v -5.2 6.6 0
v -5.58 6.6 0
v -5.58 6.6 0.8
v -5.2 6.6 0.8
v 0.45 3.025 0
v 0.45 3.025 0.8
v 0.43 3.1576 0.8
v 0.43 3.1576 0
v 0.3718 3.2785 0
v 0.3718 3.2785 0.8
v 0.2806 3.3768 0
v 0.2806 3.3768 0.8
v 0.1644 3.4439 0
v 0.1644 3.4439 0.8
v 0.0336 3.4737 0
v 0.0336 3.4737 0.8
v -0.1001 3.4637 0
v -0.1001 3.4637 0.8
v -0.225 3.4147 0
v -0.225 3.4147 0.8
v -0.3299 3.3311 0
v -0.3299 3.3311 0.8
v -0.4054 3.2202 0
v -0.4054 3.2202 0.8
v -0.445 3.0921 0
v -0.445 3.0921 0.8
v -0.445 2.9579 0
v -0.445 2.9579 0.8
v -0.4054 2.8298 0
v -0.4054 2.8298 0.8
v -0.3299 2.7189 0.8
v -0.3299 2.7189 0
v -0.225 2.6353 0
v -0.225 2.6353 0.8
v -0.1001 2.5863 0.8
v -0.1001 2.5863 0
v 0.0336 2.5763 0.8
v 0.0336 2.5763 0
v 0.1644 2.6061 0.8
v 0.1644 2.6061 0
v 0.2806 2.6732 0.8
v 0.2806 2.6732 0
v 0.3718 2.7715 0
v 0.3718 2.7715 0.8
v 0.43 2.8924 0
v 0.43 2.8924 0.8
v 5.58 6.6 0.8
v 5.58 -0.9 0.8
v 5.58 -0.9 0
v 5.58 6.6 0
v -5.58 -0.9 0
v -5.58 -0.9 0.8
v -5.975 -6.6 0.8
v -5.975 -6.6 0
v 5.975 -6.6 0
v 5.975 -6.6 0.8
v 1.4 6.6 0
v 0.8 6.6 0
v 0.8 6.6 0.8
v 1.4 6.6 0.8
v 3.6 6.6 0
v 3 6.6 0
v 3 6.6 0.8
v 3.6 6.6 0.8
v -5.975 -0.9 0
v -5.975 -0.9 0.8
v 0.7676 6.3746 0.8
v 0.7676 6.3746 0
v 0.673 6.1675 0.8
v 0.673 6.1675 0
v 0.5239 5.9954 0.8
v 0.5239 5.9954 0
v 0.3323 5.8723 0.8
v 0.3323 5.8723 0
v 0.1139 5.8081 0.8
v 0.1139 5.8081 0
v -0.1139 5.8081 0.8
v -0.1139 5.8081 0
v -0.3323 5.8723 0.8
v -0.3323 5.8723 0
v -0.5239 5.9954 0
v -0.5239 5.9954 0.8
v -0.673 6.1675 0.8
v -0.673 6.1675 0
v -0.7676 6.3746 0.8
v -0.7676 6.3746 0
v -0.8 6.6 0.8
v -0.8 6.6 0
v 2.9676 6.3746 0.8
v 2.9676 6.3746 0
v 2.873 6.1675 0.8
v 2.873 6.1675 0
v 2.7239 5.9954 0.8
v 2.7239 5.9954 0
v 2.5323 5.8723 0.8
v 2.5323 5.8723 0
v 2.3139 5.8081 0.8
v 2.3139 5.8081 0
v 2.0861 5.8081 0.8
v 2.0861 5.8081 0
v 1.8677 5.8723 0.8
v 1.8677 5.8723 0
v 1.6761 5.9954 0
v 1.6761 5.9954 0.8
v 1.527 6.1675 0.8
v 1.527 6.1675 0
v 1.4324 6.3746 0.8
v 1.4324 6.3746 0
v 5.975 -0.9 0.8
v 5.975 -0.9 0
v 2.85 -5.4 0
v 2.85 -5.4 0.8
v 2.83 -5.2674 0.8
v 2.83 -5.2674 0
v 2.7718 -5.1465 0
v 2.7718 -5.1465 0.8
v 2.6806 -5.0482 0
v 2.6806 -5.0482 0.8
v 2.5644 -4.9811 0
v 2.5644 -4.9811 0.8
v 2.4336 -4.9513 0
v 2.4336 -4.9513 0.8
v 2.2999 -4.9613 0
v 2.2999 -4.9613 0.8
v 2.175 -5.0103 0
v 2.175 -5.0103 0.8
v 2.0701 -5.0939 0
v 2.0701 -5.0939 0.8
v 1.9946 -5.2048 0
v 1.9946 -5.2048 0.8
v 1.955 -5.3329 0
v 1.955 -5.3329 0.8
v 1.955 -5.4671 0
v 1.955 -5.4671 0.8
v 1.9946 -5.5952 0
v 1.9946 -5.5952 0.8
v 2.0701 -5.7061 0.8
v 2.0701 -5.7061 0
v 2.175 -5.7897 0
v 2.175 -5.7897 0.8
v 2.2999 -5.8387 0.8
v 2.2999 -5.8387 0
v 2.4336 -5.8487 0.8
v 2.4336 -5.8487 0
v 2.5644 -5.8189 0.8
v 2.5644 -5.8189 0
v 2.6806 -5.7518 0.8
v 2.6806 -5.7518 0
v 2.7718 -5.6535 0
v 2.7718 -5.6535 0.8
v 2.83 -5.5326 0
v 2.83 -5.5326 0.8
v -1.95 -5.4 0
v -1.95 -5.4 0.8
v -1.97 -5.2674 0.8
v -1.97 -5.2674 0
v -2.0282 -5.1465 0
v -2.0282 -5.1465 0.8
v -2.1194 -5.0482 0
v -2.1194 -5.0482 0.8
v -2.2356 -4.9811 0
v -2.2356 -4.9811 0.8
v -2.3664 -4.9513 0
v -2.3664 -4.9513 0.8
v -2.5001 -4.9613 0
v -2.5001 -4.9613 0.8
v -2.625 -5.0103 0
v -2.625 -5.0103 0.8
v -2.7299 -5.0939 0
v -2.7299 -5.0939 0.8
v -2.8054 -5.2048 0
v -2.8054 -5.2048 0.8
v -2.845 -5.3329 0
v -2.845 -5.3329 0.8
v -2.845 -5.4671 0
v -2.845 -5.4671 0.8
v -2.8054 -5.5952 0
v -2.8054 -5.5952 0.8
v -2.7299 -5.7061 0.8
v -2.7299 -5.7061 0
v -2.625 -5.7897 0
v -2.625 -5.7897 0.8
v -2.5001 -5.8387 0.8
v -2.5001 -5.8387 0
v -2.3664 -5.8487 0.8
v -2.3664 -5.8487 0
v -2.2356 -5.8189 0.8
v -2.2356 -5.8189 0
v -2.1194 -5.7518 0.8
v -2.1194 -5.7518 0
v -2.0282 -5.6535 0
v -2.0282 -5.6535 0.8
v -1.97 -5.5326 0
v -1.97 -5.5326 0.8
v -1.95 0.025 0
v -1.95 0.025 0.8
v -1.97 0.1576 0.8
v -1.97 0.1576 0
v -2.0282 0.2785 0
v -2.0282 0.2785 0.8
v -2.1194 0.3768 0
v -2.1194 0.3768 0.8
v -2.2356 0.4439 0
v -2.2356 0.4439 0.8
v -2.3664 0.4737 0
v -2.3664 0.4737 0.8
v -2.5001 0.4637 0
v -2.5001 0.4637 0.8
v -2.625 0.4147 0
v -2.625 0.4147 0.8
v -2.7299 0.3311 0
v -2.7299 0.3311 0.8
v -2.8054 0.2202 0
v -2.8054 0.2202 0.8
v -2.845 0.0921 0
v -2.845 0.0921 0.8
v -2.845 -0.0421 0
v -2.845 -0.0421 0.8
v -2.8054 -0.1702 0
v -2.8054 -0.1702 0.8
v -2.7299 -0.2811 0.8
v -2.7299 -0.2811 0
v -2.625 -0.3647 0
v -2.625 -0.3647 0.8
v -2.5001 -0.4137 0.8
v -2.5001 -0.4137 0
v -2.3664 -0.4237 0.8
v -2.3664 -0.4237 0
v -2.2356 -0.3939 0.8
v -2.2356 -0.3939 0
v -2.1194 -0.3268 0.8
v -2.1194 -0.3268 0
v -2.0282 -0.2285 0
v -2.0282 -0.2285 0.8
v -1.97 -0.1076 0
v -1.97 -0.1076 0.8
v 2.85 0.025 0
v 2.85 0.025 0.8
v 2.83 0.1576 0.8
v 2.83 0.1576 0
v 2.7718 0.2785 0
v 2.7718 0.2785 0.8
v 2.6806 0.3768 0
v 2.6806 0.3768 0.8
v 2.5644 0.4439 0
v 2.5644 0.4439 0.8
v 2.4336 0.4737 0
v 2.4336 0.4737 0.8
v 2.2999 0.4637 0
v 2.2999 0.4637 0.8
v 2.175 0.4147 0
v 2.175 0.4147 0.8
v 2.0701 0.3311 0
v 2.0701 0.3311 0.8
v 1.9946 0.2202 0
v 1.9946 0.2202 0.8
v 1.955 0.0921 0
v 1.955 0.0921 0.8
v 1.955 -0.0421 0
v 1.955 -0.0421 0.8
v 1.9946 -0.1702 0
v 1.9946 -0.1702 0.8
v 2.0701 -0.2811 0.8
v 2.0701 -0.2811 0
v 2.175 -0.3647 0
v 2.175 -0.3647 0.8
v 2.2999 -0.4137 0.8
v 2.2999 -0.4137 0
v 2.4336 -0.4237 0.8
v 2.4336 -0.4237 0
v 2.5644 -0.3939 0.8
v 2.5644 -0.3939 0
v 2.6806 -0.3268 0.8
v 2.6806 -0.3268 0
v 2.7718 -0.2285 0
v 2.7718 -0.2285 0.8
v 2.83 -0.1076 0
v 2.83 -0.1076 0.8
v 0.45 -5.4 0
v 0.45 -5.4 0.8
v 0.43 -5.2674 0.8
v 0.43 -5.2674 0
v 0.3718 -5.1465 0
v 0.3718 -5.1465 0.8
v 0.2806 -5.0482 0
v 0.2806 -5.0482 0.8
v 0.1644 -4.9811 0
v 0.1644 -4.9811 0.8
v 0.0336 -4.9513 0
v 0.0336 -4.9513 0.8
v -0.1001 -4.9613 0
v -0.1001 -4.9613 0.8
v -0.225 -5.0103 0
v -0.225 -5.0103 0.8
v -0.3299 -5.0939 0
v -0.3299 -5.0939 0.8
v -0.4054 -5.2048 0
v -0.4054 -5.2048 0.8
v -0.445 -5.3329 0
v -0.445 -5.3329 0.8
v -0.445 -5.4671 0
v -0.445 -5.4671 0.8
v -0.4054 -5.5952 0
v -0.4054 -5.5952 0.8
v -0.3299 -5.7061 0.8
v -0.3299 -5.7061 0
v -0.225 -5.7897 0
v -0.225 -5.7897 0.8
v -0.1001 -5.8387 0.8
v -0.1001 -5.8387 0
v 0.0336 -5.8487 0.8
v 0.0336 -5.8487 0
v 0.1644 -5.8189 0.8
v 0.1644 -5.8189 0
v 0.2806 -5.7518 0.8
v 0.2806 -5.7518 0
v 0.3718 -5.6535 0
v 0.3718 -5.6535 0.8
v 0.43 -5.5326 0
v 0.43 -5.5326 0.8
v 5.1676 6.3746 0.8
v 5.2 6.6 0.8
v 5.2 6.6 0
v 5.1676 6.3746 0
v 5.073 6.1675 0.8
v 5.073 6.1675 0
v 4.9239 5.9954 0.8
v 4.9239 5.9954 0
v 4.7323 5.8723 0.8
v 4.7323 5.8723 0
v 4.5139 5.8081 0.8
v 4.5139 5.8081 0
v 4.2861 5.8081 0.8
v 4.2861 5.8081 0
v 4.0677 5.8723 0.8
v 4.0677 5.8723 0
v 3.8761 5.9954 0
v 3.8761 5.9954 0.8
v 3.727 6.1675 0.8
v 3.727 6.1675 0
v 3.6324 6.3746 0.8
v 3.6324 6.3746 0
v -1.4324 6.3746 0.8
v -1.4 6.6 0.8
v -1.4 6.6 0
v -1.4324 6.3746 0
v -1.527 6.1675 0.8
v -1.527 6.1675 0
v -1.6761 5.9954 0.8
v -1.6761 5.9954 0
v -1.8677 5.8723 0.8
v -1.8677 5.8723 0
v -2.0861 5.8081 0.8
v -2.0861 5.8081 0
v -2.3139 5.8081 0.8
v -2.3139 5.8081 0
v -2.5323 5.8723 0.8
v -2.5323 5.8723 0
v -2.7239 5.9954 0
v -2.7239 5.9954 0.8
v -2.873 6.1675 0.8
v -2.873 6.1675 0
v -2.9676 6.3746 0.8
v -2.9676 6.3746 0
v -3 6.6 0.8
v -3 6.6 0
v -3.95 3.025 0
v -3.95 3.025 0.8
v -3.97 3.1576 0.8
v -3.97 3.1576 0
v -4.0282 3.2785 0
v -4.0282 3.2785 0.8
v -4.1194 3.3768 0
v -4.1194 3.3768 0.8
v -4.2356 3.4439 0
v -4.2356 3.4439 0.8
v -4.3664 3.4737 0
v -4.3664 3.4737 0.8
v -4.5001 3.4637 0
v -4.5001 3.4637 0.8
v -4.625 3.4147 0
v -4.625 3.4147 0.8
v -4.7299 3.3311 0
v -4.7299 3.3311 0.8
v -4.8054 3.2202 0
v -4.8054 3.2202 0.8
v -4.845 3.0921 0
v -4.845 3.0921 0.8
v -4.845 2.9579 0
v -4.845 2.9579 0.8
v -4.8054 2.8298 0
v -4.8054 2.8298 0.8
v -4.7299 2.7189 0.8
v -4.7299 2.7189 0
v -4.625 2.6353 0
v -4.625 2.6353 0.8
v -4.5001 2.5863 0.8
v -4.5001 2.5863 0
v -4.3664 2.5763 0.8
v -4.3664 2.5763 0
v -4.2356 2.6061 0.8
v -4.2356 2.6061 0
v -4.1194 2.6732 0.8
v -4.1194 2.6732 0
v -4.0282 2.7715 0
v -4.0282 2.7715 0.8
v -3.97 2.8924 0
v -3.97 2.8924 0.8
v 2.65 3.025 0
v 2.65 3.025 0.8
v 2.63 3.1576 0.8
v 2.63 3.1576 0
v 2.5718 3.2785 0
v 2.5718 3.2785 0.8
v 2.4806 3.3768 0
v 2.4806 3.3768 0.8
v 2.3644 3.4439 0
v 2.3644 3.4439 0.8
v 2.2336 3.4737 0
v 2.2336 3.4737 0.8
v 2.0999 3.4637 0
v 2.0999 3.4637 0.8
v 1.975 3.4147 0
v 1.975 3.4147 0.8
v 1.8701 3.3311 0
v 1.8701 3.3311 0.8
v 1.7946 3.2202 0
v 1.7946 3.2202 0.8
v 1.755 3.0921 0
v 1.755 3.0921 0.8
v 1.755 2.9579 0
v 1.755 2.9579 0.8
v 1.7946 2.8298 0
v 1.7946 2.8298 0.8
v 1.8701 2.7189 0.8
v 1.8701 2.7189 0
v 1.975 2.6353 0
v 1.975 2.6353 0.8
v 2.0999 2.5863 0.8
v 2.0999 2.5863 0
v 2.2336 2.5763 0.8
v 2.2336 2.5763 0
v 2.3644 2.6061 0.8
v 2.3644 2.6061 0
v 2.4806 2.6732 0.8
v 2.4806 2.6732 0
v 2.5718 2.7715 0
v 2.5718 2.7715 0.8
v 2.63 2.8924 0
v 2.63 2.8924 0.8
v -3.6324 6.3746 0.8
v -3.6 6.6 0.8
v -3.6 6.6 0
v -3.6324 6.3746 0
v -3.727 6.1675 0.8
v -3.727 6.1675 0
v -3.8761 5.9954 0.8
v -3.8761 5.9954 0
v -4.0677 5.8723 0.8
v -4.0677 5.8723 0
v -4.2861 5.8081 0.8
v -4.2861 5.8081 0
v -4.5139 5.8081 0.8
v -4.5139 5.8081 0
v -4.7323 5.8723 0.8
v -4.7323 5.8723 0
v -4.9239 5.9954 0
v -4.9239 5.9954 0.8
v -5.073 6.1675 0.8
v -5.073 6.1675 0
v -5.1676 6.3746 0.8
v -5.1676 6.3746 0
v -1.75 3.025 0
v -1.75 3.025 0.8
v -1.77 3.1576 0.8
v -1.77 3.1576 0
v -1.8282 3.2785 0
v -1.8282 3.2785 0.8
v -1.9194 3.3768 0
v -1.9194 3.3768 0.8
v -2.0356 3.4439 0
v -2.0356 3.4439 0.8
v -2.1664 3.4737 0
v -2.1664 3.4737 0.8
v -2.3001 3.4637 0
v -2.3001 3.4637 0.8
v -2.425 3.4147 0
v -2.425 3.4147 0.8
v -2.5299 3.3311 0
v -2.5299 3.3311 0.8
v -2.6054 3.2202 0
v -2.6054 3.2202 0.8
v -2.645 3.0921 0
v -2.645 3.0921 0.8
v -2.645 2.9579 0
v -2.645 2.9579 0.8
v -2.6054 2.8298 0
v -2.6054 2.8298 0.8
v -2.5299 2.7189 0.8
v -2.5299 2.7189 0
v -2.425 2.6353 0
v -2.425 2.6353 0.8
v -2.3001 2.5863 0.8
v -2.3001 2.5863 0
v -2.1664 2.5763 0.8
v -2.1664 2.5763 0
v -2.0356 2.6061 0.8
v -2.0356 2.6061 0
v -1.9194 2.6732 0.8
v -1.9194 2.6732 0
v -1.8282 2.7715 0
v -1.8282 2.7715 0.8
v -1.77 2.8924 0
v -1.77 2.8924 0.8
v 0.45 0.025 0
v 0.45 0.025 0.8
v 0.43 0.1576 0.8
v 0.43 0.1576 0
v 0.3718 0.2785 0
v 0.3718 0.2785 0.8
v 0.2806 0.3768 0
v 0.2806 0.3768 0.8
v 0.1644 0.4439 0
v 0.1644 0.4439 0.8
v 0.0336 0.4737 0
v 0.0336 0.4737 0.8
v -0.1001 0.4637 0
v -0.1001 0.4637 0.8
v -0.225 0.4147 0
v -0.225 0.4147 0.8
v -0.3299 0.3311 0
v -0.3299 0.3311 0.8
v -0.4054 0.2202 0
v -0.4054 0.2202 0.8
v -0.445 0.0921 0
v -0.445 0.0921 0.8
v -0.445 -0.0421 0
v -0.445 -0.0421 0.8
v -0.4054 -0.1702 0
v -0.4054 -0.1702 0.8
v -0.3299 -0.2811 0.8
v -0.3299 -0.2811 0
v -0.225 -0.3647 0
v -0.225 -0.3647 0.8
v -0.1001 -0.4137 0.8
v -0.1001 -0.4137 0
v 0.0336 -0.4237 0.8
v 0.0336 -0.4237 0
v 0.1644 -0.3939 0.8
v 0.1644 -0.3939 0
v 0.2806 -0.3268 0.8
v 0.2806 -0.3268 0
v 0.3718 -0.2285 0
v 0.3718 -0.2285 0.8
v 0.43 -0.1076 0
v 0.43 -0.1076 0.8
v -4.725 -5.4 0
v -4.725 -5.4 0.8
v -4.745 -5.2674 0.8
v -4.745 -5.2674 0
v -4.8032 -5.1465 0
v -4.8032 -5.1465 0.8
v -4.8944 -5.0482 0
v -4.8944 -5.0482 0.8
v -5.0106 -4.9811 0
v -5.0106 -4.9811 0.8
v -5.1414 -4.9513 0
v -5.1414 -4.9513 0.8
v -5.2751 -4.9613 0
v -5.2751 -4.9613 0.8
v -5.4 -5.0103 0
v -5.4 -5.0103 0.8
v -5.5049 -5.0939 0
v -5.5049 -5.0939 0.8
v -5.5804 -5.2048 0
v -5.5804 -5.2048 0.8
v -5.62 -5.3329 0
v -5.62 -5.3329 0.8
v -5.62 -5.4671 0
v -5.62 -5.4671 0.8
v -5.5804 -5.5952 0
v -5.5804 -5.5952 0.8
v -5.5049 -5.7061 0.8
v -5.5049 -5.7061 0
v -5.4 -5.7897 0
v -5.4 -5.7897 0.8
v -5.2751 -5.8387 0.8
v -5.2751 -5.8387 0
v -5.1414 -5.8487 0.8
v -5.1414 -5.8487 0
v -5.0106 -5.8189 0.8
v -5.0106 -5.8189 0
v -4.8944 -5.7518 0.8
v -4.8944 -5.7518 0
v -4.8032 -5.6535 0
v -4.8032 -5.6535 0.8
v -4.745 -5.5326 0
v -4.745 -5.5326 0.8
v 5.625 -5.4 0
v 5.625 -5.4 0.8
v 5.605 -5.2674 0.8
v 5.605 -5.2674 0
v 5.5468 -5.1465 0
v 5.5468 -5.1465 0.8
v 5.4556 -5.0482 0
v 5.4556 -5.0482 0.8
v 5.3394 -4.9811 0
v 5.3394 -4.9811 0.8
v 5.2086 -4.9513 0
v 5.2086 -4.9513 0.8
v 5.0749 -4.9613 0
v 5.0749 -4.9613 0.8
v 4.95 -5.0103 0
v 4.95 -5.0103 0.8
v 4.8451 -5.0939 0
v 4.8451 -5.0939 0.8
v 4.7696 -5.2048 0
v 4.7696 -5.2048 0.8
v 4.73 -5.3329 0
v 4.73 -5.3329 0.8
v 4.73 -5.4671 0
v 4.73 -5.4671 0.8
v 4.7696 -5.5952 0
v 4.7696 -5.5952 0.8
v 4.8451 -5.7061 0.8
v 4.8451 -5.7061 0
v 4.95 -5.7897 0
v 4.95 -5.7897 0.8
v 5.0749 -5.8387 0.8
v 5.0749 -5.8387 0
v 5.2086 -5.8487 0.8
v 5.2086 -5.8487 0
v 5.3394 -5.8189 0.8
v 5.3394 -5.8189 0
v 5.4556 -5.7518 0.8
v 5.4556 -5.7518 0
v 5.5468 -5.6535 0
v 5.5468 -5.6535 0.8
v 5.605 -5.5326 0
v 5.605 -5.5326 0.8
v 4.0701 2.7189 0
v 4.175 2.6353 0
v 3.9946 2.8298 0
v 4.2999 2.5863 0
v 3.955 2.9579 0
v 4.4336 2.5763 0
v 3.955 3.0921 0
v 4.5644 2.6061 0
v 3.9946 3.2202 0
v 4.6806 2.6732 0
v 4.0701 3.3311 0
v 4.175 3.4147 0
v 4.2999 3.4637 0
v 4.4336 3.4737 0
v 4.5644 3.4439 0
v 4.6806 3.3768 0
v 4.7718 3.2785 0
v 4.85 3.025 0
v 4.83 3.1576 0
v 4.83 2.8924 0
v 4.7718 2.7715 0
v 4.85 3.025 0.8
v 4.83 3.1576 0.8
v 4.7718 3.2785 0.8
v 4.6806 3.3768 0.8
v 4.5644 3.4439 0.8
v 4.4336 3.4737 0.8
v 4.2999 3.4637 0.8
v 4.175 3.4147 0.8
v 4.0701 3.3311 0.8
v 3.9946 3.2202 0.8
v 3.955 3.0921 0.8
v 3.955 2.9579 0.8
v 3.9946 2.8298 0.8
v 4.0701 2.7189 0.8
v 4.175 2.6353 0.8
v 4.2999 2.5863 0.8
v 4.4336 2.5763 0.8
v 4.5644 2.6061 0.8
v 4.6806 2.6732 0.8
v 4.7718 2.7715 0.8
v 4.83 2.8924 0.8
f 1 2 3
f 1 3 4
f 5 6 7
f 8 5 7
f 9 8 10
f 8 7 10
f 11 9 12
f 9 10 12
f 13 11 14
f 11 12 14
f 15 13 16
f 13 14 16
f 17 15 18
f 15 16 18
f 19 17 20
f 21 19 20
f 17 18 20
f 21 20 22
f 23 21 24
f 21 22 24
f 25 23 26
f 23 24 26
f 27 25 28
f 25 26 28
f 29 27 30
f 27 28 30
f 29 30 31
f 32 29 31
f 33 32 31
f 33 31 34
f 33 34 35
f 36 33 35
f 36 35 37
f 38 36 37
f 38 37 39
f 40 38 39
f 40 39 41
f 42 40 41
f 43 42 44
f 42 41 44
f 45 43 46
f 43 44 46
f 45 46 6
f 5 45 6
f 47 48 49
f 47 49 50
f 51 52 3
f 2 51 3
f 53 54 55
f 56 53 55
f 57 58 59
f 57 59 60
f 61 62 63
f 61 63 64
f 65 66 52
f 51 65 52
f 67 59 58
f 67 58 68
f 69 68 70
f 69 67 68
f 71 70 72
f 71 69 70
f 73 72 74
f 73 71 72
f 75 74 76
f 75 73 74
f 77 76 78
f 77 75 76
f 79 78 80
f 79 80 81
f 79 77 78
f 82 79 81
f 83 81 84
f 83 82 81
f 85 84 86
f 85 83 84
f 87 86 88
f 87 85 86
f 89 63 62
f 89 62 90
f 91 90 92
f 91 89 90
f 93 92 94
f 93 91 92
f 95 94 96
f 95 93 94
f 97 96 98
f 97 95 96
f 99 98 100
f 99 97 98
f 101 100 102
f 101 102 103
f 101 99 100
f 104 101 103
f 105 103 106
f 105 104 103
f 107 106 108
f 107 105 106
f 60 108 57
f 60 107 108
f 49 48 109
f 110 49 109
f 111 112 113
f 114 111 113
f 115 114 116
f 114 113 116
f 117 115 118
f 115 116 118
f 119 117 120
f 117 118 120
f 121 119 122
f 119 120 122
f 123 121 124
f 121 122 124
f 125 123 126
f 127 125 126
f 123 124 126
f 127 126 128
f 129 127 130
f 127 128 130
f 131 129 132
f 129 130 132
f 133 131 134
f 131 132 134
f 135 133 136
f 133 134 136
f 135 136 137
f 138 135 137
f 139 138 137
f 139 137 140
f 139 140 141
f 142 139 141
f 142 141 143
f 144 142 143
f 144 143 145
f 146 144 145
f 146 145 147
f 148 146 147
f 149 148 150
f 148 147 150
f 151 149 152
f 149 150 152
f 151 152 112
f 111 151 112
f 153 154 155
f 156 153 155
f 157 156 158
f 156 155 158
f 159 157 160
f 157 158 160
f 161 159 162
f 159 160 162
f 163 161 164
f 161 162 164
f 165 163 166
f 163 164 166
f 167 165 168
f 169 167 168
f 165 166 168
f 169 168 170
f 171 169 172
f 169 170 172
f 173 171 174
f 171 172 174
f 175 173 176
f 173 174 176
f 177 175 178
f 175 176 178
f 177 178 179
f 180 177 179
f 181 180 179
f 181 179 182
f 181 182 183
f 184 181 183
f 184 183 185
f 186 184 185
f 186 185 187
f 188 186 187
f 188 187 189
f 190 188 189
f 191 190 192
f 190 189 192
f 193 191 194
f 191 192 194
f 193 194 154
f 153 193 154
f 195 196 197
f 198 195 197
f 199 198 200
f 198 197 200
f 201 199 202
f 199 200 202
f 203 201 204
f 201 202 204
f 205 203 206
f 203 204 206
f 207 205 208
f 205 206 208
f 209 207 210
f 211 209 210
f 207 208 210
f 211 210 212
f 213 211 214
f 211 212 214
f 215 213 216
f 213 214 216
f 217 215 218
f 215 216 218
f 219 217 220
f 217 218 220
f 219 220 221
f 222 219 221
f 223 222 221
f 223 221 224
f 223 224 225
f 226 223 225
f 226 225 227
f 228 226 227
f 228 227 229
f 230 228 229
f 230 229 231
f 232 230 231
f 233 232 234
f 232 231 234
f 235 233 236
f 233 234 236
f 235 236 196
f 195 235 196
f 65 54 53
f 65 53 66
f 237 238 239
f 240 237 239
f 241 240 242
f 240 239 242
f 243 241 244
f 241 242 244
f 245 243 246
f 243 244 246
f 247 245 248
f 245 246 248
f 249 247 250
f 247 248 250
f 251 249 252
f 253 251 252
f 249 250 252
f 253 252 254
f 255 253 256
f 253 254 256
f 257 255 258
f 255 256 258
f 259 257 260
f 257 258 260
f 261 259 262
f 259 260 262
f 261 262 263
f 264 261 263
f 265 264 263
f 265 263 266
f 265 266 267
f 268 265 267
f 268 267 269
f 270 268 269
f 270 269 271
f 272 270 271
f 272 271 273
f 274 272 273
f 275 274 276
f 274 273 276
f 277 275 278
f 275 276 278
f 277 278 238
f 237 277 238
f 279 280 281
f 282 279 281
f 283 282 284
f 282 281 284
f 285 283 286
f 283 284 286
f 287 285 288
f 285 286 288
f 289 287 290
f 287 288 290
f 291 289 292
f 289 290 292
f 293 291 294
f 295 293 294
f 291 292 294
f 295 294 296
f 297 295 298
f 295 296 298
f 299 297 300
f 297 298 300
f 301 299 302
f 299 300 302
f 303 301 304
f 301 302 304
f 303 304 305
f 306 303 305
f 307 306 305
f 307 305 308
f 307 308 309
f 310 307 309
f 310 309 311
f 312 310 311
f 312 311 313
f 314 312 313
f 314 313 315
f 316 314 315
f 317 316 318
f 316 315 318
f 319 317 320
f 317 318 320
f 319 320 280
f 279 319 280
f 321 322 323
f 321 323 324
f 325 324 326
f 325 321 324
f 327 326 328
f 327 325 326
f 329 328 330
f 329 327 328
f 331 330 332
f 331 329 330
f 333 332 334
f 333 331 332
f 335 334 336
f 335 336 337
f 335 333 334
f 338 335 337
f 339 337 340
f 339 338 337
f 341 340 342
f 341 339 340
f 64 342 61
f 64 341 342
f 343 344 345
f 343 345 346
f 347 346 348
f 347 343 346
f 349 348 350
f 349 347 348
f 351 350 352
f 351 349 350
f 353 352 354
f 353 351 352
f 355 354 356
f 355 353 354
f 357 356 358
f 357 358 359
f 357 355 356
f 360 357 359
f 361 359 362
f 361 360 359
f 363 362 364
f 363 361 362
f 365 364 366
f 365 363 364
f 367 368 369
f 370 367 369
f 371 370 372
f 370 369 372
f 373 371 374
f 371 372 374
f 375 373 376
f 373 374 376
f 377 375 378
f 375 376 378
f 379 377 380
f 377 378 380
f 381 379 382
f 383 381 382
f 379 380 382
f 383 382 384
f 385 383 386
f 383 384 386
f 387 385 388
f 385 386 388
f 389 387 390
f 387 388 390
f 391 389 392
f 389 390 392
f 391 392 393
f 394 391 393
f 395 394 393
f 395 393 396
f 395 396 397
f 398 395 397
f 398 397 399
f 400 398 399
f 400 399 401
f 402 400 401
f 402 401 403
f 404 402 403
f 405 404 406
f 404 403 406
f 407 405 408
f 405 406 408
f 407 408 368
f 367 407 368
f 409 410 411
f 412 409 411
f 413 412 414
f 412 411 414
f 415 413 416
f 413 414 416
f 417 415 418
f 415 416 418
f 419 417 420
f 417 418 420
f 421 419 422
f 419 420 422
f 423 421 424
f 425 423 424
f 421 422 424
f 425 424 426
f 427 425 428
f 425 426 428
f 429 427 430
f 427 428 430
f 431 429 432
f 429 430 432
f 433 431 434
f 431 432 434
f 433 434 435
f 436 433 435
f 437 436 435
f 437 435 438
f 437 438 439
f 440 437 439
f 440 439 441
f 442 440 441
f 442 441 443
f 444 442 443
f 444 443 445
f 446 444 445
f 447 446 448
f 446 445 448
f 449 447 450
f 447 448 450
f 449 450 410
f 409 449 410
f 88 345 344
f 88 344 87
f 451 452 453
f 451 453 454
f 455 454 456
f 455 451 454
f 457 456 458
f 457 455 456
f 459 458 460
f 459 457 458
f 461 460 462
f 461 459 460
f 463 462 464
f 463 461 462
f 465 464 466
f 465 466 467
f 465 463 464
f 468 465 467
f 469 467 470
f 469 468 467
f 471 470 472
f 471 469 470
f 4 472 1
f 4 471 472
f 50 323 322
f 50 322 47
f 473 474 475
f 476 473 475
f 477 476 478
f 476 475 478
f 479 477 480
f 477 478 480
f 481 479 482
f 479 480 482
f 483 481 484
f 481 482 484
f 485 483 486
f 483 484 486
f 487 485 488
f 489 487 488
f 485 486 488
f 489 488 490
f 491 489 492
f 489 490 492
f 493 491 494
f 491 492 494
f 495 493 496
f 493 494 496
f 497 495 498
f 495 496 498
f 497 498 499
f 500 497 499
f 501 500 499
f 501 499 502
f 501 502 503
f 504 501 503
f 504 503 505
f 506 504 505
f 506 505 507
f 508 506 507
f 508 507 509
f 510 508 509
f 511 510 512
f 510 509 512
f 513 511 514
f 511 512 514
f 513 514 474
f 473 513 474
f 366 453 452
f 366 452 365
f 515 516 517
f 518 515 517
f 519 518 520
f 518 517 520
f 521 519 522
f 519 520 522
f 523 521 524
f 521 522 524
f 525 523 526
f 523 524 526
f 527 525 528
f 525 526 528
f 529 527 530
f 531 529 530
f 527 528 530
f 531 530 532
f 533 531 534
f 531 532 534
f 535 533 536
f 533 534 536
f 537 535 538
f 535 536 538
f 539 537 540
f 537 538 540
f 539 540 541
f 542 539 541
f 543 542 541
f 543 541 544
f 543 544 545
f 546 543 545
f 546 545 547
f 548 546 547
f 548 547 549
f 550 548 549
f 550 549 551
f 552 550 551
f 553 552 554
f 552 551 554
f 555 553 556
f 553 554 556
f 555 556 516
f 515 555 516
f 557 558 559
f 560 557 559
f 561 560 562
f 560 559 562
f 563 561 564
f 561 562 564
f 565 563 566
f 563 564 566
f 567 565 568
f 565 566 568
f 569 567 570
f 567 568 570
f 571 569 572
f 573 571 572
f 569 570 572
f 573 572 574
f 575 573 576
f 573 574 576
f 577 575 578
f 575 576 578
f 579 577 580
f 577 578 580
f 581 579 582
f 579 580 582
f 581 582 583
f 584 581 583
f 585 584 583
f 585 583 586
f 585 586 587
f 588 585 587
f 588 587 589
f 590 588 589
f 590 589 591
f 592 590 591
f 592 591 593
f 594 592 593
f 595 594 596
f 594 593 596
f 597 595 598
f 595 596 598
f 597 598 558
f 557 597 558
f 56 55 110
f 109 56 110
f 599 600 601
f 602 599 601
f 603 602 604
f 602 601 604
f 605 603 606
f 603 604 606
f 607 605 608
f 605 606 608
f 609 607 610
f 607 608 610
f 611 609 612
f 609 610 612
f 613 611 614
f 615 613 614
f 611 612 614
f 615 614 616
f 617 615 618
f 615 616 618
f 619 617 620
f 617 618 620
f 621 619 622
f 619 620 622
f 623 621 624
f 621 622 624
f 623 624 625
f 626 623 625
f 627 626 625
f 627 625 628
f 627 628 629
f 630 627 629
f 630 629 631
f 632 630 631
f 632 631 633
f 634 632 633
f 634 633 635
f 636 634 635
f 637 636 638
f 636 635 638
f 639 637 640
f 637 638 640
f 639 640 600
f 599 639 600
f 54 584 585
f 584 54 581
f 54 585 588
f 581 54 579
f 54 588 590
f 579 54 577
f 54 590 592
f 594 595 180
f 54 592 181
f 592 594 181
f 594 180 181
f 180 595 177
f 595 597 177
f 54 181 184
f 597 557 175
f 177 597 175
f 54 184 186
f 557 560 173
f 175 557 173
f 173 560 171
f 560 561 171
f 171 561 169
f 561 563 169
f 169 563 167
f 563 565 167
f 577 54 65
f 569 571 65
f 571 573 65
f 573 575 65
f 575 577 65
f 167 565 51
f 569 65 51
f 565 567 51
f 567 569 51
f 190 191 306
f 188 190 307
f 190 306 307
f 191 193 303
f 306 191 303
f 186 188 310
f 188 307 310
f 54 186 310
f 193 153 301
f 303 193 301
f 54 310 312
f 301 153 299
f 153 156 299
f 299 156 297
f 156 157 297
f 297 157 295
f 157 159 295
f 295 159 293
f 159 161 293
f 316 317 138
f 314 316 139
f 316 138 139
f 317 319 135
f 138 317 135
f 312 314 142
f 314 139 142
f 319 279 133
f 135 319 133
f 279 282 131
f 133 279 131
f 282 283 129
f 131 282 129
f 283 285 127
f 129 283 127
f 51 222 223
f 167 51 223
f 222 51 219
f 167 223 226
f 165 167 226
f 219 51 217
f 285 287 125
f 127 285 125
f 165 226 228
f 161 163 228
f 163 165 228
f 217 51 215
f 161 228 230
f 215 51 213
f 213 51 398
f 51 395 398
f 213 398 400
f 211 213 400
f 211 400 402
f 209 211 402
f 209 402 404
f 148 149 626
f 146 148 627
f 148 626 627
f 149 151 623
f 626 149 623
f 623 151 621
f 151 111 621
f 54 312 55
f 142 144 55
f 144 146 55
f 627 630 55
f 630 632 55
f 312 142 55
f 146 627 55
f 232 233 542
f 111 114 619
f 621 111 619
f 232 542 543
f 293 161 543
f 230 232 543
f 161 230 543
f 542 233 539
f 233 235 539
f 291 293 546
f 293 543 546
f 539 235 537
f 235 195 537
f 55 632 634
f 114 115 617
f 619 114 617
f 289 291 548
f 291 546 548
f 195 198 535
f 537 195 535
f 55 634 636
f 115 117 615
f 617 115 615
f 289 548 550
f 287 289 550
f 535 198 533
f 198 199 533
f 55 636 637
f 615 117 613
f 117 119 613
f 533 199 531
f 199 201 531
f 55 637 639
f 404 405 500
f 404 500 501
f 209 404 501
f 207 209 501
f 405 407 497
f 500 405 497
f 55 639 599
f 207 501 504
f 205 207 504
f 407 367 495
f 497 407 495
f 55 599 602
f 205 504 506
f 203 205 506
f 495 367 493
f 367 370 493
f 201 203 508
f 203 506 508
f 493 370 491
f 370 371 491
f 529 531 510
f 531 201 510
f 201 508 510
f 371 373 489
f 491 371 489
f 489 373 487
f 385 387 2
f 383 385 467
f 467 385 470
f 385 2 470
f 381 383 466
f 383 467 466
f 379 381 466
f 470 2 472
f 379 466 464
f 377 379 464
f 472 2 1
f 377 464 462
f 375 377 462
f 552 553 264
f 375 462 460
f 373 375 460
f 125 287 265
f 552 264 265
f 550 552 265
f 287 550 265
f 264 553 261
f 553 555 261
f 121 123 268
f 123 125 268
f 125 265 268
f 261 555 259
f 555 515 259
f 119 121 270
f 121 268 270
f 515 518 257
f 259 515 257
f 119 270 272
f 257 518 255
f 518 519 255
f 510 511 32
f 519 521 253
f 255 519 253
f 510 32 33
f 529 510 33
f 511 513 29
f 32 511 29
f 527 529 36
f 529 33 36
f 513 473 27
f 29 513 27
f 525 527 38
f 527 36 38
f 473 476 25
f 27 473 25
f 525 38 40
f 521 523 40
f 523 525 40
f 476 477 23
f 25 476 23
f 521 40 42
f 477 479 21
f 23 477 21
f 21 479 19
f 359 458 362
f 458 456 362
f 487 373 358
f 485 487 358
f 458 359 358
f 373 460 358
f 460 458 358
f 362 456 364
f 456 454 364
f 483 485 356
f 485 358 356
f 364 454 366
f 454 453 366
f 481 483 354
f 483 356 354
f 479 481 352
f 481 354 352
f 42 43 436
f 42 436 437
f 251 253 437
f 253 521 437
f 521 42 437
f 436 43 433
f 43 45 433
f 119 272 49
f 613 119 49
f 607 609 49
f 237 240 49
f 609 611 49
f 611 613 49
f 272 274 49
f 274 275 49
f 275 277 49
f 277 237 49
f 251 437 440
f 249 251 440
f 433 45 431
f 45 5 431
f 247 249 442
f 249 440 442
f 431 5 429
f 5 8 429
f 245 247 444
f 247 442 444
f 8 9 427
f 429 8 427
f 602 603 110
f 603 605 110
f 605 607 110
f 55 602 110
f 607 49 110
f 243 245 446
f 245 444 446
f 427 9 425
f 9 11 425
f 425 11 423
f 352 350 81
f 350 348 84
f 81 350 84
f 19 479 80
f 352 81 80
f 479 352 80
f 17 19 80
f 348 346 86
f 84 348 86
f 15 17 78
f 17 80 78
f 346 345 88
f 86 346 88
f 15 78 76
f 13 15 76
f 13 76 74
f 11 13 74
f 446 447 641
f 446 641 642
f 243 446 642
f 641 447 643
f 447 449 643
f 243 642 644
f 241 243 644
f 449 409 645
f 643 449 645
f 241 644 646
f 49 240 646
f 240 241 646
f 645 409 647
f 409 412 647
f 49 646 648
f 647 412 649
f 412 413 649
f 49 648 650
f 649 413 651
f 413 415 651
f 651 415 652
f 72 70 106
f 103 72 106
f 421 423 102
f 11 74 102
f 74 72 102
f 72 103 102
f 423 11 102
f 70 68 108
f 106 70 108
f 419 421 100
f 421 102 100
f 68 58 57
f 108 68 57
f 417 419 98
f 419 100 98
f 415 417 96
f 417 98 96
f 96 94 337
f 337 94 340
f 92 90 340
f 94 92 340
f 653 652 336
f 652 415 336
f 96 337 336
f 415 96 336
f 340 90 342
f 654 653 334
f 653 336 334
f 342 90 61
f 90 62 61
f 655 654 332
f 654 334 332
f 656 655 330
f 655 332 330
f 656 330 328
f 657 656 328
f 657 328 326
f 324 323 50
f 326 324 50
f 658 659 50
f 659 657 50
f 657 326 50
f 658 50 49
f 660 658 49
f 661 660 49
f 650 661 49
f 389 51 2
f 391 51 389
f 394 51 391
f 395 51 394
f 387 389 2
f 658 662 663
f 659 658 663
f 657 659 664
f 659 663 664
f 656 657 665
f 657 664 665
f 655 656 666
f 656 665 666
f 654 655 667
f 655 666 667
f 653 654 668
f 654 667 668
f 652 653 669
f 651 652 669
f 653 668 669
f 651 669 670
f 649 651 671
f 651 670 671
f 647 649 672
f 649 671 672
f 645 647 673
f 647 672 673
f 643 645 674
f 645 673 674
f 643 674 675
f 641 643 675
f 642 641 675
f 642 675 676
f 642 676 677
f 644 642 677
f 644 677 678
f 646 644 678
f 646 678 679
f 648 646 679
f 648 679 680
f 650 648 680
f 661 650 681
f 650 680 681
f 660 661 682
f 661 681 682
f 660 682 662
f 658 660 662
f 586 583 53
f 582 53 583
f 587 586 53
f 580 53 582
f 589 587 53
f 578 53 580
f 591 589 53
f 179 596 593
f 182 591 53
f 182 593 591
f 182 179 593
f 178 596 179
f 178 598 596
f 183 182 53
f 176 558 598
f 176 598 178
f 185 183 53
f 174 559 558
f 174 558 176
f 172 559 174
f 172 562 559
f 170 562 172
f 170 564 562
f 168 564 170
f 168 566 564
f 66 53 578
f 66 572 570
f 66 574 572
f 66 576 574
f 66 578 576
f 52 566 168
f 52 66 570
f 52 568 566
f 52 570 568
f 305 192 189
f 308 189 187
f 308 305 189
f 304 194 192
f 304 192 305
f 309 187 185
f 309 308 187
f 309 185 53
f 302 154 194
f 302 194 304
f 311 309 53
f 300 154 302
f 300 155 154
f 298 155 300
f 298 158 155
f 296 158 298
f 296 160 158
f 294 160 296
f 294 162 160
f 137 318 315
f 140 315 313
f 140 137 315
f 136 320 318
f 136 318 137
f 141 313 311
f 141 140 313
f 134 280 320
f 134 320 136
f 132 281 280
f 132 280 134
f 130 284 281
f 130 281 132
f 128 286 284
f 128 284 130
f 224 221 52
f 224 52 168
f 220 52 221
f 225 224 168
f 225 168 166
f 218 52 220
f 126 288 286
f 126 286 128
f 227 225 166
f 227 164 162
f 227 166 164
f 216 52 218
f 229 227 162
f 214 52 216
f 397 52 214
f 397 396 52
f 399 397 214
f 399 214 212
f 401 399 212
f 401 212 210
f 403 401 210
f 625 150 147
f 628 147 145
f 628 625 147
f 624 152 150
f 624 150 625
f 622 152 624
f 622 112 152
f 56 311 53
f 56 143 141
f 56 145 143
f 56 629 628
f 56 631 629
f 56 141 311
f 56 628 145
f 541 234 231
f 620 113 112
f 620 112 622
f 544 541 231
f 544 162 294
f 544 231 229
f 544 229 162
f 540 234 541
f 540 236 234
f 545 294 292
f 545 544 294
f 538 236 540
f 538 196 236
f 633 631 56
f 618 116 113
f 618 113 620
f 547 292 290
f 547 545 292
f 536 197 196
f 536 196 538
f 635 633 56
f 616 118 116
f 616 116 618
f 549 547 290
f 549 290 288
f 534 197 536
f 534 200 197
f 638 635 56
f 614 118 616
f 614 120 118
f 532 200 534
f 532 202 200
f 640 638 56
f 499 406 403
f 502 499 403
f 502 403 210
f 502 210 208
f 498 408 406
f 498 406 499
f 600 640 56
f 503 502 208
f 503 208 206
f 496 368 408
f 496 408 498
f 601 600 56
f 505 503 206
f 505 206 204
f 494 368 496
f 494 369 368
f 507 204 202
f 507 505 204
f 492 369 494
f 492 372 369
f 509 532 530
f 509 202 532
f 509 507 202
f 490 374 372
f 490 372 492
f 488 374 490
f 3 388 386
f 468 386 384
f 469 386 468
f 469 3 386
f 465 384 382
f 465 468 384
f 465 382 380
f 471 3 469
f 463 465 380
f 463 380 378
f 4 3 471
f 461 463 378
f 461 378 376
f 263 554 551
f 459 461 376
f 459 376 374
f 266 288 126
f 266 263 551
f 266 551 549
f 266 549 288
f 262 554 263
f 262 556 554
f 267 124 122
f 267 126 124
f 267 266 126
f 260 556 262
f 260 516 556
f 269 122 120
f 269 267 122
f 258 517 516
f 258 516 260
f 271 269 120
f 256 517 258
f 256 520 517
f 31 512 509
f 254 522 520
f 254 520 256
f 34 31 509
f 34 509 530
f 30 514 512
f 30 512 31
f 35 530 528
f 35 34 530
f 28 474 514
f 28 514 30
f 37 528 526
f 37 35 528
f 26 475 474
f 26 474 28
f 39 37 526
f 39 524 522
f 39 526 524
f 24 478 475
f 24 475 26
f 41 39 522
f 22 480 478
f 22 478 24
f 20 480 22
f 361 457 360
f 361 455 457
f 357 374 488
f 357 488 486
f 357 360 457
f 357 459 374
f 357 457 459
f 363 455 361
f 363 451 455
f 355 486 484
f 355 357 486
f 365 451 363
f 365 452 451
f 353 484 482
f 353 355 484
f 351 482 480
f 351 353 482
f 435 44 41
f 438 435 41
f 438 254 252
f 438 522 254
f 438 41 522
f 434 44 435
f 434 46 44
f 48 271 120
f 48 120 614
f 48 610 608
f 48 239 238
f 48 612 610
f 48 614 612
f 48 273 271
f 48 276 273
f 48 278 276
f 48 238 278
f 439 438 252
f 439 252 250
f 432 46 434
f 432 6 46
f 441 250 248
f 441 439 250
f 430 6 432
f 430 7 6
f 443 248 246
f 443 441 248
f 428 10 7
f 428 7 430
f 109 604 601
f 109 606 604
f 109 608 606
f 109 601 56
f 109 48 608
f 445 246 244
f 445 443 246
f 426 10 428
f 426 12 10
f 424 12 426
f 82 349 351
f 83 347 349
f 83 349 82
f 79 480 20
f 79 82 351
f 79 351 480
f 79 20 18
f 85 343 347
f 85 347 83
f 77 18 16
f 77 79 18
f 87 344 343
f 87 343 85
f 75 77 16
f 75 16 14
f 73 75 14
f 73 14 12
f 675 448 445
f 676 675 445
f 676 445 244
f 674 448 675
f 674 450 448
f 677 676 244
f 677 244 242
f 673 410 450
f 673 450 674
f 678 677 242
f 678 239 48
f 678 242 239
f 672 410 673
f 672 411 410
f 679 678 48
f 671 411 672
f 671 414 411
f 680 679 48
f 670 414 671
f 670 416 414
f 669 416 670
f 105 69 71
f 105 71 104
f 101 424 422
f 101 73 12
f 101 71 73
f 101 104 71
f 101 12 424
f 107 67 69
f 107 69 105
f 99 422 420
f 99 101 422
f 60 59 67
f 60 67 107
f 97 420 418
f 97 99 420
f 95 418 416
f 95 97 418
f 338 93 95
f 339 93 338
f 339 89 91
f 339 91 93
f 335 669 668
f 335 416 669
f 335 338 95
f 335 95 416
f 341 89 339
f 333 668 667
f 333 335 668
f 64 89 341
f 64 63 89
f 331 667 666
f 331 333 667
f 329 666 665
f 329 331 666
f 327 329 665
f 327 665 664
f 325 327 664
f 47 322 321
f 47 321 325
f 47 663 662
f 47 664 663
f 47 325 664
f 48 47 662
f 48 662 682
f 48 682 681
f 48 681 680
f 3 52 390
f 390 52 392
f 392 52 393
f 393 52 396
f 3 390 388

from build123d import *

# Parameters (mm, degrees)
SKETCH_1_W          = 11.95
SKETCH_1_H          = 13.2
EXTRUDE_1_DEPTH     = 0.8
SKETCH_2_W          = 0.395
SKETCH_2_H          = 7.5
CUT_EXTRUDE_1_DEPTH = 0.8
CUT_EXTRUDE_2_DEPTH = 0.8
SKETCH_4_R          = 0.45
CUT_EXTRUDE_3_DEPTH = 0.8


with BuildPart() as part:
    # Эскиз1 → Бобышка-Вытянуть1 (new body)
    with BuildSketch(Plane.XY):
        Rectangle(SKETCH_1_W, SKETCH_1_H)
    extrude(amount=EXTRUDE_1_DEPTH)

    # Эскиз2 → Вырез-Вытянуть1 (cut)
    with BuildSketch(Plane.XY.offset(0.8)):
        with Locations((-5.7775, 2.85)):
            Rectangle(SKETCH_2_W, SKETCH_2_H)
        with Locations((5.7775, 2.85)):
            Rectangle(SKETCH_2_W, SKETCH_2_H)
    extrude(amount=-CUT_EXTRUDE_1_DEPTH, mode=Mode.SUBTRACT)

    # Эскиз3 → Вырез-Вытянуть2 (cut)
    with BuildSketch(Plane.XY.offset(0.8)):
        with BuildLine():
            Line((-5.2, 6.6), (-3.6, 6.6))
            ThreePointArc((-3.6, 6.6), (-4.4, 5.8), (-5.2, 6.6))
        make_face()
        with BuildLine():
            Line((-3, 6.6), (-1.4, 6.6))
            ThreePointArc((-1.4, 6.6), (-2.2, 5.8), (-3, 6.6))
        make_face()
        with BuildLine():
            Line((-0.8, 6.6), (0.8, 6.6))
            ThreePointArc((0.8, 6.6), (0, 5.8), (-0.8, 6.6))
        make_face()
        with BuildLine():
            Line((1.4, 6.6), (3, 6.6))
            ThreePointArc((3, 6.6), (2.2, 5.8), (1.4, 6.6))
        make_face()
        with BuildLine():
            Line((3.6, 6.6), (5.2, 6.6))
            ThreePointArc((5.2, 6.6), (4.4, 5.8), (3.6, 6.6))
        make_face()
    extrude(amount=-CUT_EXTRUDE_2_DEPTH, mode=Mode.SUBTRACT)

    # Эскиз4 → Вырез-Вытянуть3 (cut)
    with BuildSketch(Plane.XY.offset(0.8)):
        with Locations((-2.4, -5.4)):
            Circle(SKETCH_4_R)
        with Locations((0, -5.4)):
            Circle(SKETCH_4_R)
        with Locations((2.4, -5.4)):
            Circle(SKETCH_4_R)
        with Locations((-2.4, 0.025)):
            Circle(SKETCH_4_R)
        with Locations((0, 0.025)):
            Circle(SKETCH_4_R)
        with Locations((2.4, 0.025)):
            Circle(SKETCH_4_R)
        with Locations((-5.175, -5.4)):
            Circle(SKETCH_4_R)
        with Locations((5.175, -5.4)):
            Circle(SKETCH_4_R)
        with Locations((-4.4, 3.025)):
            Circle(SKETCH_4_R)
        with Locations((-2.2, 3.025)):
            Circle(SKETCH_4_R)
        with Locations((0, 3.025)):
            Circle(SKETCH_4_R)
        with Locations((2.2, 3.025)):
            Circle(SKETCH_4_R)
        with Locations((4.4, 3.025)):
            Circle(SKETCH_4_R)
    extrude(amount=-CUT_EXTRUDE_3_DEPTH, mode=Mode.SUBTRACT)


solid = part.part
